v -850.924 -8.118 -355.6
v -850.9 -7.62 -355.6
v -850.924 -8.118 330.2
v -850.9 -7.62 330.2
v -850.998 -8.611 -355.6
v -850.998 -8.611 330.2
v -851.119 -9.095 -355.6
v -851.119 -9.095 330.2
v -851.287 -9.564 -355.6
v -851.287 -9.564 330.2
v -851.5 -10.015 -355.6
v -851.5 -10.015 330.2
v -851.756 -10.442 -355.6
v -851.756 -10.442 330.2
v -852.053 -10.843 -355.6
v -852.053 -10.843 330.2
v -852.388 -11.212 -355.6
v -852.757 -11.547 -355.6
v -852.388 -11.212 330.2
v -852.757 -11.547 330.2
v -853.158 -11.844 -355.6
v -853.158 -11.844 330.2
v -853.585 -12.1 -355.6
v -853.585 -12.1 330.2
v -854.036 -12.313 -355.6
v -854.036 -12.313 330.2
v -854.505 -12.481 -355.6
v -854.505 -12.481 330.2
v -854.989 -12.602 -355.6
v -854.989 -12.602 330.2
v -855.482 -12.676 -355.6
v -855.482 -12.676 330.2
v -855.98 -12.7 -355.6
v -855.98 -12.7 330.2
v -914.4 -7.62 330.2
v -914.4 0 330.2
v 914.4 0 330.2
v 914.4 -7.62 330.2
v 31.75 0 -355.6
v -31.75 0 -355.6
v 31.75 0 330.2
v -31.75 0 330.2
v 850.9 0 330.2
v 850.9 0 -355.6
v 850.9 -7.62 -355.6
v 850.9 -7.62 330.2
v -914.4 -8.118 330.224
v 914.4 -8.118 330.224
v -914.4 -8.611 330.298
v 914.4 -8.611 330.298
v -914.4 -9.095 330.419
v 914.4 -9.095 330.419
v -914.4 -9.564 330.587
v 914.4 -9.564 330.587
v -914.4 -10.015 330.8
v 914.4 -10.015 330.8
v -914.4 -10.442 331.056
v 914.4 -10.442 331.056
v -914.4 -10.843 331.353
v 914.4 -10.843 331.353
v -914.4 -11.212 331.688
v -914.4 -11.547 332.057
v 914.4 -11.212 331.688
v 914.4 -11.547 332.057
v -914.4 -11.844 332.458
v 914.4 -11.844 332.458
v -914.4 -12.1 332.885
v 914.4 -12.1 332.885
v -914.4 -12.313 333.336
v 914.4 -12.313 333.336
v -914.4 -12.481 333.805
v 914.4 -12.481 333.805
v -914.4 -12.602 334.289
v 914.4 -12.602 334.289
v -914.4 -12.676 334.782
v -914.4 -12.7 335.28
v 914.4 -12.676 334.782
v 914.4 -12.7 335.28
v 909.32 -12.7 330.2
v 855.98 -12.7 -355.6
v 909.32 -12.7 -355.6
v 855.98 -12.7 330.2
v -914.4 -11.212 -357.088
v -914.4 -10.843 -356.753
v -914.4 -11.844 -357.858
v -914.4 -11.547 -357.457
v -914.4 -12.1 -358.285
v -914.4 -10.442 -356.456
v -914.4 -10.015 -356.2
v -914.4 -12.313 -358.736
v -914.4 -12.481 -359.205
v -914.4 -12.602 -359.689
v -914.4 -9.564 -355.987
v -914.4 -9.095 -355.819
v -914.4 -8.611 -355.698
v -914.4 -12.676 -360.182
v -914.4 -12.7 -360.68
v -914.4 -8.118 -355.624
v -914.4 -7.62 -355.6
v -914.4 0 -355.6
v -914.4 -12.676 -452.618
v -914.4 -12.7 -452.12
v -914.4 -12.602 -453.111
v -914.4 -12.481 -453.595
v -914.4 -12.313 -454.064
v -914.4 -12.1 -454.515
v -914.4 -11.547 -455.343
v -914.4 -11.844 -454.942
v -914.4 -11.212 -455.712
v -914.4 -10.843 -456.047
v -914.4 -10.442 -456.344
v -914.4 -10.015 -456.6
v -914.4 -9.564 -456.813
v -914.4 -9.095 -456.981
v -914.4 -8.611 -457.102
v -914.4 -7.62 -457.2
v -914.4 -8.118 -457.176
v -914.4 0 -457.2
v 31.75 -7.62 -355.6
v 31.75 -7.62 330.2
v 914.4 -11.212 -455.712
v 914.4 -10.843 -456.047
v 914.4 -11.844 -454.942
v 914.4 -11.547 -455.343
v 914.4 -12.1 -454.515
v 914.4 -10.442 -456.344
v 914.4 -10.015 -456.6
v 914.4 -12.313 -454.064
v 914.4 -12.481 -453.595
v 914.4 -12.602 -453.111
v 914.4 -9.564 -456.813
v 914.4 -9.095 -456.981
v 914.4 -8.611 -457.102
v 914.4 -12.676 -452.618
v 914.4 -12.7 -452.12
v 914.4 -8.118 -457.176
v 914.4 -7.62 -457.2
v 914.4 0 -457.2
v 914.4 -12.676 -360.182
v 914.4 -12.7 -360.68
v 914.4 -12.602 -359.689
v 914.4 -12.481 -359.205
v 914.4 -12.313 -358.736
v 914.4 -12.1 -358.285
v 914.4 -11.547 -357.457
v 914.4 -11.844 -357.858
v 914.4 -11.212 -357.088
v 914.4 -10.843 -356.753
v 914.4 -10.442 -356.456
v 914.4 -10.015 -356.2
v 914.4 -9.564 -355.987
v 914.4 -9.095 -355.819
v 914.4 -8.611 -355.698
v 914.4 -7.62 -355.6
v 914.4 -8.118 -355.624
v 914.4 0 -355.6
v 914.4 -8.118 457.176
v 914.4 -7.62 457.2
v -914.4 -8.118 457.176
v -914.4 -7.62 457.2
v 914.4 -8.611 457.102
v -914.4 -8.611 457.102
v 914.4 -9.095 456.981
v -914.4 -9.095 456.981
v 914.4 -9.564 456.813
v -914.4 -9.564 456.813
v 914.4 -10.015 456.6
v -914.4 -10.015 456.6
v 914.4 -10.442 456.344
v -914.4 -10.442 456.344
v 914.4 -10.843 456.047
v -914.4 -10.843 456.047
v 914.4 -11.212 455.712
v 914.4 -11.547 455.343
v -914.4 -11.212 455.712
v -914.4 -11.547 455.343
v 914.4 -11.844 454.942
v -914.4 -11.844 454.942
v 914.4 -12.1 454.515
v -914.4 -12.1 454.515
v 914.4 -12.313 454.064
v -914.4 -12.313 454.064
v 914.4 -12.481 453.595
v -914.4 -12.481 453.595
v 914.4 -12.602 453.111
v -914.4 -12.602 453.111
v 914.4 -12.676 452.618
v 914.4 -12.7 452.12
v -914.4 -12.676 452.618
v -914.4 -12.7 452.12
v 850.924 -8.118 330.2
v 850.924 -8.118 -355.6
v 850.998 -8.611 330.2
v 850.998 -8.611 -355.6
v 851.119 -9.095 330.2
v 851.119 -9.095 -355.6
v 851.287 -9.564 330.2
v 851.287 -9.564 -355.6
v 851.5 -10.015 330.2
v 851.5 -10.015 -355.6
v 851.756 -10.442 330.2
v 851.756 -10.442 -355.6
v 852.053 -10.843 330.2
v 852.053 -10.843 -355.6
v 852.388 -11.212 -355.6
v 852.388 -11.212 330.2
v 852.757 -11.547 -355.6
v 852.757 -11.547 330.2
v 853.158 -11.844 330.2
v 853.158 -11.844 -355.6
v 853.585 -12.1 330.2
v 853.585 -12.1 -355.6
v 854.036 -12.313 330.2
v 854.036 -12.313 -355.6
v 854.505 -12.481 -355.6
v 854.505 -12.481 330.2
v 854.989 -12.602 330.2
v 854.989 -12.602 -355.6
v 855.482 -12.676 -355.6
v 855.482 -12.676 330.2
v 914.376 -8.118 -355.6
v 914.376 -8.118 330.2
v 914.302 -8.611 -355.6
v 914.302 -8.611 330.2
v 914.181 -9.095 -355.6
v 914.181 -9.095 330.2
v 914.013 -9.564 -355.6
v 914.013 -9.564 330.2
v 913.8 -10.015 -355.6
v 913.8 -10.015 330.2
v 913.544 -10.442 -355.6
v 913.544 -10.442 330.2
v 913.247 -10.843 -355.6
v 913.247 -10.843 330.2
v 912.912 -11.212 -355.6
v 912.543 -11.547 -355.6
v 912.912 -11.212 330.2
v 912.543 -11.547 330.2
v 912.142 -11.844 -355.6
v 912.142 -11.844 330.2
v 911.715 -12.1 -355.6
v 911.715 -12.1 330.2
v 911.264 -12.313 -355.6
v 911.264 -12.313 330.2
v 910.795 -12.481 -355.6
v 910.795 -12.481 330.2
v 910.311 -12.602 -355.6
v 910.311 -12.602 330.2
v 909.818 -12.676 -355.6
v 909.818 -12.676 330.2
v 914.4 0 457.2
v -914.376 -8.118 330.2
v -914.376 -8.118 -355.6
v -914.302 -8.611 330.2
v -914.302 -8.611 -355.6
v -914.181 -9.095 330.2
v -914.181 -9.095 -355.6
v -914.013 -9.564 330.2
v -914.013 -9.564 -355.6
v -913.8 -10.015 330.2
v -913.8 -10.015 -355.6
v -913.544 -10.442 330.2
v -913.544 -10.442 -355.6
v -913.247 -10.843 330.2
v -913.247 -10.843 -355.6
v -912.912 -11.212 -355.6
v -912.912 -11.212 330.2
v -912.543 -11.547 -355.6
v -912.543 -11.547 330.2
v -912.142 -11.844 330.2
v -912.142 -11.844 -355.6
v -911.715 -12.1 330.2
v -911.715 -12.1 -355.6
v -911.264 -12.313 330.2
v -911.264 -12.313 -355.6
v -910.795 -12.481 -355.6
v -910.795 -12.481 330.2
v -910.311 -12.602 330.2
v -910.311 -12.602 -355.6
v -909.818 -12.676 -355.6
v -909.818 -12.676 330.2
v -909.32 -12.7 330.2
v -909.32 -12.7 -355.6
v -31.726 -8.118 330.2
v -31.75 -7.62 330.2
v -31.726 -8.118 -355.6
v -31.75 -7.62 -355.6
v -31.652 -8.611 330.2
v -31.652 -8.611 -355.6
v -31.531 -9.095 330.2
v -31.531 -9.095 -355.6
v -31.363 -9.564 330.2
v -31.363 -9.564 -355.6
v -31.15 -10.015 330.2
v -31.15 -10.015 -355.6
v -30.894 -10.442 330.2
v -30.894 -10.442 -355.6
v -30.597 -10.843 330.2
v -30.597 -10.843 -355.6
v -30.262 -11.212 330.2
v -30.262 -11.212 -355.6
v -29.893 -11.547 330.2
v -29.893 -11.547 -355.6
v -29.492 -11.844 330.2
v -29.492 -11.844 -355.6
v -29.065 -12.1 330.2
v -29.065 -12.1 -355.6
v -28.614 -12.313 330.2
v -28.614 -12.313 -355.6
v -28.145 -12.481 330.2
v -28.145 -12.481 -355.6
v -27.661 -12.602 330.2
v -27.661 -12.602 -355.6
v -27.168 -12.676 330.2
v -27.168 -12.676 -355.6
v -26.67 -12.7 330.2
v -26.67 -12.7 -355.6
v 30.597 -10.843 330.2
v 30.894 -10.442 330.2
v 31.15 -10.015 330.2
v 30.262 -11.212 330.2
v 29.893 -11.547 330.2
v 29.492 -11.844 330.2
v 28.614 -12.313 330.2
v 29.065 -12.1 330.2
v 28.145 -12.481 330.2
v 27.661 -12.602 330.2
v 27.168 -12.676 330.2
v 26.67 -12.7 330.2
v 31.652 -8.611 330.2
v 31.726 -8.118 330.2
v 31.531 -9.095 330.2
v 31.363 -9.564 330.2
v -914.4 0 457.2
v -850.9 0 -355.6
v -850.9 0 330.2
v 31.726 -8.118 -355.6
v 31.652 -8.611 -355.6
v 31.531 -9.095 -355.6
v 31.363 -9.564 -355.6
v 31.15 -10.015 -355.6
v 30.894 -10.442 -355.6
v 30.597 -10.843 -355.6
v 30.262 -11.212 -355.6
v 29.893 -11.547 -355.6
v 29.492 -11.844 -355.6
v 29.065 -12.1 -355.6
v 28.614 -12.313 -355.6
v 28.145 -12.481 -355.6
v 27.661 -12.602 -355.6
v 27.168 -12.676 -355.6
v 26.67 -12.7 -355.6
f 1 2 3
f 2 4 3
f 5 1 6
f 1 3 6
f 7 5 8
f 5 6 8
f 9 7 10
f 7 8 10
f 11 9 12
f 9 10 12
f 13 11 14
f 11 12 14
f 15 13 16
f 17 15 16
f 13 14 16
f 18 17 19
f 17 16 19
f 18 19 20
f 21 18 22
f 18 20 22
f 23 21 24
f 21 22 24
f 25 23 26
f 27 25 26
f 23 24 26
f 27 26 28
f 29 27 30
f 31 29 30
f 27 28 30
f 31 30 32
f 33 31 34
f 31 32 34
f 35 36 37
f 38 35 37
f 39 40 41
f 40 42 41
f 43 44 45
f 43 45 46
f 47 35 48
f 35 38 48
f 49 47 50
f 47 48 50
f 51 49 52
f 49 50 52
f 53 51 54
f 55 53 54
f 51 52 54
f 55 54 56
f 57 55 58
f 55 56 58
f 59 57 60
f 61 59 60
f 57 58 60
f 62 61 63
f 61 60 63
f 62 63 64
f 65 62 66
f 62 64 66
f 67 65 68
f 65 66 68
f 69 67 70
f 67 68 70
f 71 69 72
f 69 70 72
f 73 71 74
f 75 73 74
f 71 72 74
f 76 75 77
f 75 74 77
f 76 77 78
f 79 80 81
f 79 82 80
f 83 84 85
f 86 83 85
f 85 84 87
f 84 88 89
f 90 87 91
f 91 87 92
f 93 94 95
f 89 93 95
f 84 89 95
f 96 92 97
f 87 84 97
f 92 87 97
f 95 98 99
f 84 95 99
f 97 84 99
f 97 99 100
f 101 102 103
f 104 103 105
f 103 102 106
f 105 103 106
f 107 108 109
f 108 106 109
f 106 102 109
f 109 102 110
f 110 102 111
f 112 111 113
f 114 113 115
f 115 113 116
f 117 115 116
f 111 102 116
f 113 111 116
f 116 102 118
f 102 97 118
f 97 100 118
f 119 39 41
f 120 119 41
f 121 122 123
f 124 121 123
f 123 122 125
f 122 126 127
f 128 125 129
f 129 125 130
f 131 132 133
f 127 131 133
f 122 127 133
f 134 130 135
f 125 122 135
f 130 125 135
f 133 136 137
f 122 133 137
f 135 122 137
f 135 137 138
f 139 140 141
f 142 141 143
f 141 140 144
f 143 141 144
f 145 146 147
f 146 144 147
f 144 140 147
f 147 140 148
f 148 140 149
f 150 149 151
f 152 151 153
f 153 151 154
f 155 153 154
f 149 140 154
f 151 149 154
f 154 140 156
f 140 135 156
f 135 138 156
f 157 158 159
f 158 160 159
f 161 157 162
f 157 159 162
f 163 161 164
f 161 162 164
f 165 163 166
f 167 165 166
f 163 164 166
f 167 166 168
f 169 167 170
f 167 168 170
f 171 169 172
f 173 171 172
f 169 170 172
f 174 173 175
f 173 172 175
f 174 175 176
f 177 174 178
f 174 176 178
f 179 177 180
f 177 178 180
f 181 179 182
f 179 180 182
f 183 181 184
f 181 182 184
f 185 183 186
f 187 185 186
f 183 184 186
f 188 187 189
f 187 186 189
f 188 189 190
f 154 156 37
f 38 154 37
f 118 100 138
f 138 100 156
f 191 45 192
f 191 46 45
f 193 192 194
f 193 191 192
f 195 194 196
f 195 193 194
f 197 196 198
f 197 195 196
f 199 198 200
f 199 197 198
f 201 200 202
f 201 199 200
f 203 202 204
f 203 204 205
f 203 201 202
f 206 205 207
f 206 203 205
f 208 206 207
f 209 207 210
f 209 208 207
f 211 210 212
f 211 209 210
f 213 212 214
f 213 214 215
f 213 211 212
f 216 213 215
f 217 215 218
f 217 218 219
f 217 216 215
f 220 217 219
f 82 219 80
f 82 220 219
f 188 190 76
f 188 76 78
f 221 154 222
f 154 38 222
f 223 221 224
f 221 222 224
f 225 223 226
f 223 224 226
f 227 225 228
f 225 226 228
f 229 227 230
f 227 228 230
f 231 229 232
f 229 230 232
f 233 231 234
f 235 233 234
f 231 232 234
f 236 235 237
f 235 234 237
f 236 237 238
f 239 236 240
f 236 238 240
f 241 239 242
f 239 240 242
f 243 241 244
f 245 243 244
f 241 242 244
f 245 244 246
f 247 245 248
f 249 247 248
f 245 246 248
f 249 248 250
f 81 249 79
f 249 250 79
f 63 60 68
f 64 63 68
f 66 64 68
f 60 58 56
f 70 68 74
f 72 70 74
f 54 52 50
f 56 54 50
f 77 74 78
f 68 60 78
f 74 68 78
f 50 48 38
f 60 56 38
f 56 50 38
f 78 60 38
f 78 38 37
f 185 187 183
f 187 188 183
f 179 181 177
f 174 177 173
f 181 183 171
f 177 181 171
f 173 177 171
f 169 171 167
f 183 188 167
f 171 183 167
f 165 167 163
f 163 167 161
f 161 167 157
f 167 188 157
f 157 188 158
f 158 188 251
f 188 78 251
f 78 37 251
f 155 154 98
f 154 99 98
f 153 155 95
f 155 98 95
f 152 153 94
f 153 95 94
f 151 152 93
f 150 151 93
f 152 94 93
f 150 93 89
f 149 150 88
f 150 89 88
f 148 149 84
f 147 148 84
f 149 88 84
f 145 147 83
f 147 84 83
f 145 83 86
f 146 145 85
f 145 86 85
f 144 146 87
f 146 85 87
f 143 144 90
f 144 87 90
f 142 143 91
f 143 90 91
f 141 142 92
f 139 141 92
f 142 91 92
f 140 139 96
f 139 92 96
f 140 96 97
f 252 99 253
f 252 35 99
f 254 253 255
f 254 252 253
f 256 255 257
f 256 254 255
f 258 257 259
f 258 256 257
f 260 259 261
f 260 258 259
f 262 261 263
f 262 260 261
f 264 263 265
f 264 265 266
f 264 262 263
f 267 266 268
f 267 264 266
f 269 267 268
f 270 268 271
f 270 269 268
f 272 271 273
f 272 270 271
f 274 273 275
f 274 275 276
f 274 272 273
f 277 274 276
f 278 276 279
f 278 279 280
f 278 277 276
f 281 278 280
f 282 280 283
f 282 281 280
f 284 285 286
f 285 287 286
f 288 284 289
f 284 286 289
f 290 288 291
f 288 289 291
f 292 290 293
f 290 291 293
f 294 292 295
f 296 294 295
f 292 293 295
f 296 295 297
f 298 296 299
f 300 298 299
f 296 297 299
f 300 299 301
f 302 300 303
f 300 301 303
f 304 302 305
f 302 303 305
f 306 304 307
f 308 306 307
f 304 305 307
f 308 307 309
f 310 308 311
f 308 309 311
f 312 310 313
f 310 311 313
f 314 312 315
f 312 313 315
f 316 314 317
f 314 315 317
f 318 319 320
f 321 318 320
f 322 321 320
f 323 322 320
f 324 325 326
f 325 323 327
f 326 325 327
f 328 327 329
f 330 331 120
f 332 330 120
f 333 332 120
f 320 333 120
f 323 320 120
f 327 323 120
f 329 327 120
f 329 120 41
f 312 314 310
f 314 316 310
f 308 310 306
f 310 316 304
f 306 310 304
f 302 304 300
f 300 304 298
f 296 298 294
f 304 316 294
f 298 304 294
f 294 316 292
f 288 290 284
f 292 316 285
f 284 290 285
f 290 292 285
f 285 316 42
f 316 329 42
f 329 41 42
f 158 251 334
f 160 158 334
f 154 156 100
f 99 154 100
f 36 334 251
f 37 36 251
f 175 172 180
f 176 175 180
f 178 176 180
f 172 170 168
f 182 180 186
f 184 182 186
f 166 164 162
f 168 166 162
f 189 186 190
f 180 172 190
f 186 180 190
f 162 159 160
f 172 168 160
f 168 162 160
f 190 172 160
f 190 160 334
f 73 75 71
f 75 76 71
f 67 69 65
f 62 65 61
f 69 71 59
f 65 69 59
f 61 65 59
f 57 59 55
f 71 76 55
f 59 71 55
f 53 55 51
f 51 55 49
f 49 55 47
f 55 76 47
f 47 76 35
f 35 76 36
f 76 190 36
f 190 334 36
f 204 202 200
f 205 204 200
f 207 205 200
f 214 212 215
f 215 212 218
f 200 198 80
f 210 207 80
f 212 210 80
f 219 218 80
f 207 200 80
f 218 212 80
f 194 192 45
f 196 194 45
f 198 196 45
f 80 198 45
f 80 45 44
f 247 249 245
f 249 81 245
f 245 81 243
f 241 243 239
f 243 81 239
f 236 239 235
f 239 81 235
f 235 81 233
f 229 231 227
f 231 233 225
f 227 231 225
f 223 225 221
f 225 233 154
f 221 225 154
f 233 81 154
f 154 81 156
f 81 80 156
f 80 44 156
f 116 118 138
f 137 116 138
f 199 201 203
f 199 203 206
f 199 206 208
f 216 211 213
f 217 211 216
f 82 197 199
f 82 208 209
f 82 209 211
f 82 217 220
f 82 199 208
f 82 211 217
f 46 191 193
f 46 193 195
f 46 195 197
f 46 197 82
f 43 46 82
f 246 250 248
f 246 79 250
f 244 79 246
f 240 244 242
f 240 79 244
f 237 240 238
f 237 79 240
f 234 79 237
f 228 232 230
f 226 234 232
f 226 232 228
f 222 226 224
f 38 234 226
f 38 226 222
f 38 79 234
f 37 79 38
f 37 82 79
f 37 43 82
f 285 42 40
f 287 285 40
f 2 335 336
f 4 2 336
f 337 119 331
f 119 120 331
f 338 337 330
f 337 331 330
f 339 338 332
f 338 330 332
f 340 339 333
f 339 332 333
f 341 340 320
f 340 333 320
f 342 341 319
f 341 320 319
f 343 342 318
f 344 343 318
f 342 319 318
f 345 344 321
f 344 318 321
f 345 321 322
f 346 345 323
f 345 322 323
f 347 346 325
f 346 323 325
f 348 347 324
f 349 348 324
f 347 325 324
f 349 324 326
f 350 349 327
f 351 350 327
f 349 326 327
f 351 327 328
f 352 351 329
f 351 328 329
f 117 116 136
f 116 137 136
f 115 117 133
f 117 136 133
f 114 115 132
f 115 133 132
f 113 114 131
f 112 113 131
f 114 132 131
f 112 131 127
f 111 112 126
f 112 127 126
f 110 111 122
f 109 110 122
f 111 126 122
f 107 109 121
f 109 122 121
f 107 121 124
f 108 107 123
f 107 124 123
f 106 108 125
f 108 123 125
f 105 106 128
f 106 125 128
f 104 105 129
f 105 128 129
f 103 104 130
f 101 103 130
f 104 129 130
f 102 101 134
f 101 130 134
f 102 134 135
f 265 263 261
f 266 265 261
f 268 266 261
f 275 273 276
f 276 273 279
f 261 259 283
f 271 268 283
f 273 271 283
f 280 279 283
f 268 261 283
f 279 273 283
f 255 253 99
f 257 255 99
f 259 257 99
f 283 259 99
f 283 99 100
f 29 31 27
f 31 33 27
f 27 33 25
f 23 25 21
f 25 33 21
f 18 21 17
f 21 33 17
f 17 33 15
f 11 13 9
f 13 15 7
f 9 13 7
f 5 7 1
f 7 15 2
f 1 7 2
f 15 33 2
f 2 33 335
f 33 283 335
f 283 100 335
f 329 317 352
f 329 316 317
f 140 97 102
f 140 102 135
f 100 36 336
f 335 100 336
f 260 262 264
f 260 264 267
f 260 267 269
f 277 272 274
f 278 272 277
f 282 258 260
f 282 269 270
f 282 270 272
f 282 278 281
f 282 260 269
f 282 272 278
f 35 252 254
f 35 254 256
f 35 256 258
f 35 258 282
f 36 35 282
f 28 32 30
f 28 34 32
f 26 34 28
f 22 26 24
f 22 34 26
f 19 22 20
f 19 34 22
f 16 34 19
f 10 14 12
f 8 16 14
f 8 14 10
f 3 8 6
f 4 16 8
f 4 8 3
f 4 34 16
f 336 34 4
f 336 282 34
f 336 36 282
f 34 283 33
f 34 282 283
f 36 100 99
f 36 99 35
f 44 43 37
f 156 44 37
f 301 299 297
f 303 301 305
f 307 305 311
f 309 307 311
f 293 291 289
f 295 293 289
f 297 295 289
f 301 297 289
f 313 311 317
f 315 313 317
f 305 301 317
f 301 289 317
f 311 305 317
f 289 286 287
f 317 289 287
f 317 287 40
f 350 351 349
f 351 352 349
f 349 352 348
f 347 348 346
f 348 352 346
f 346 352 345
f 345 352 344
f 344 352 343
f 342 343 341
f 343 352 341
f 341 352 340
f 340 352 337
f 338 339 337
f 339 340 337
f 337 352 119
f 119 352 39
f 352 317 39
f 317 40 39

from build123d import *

# Parameters (mm, degrees)
F1_DEPTH = 12.7
F0_W     = 63.5
F0_H     = 685.8
F2_DEPTH = 12.7
F3_R     = 5.08
F3_2_R   = 5.08


with BuildPart() as f1:
    # F0 (on Front) → F1 (new body)
    with BuildSketch(Plane.XZ):
        Polygon((-914.4, 457.2), (-914.4, 330.2), (-850.9, 330.2), (-31.75, 330.2), (0, 330.2), (0, 457.2), align=None)
        Polygon((850.9, 330.2), (914.4, 330.2), (914.4, 457.2), (0, 457.2), (0, 330.2), (31.75, 330.2), align=None)
        Polygon((-914.4, -457.2), (914.4, -457.2), (914.4, -355.6), (850.9, -355.6), (31.75, -355.6), (-31.75, -355.6), (-850.9, -355.6), (-914.4, -355.6), align=None)
    extrude(amount=F1_DEPTH)

    # F3
    f3_edges = [f1.edges().sort_by_distance(p)[0] for p in [
        (0, -12.7, 457.2),
        (0, -12.7, 330.2),
        (0, -12.7, -355.6),
        (0, -12.7, -457.2),
    ]]
    fillet(f3_edges, radius=F3_R)


with BuildPart() as f2:
    # F0 (on Front) → F2 (new body)
    with BuildSketch(Plane.XZ):
        with Locations((-882.65, -12.7)):
            Rectangle(F0_W, F0_H)
        Polygon((-31.75, -355.6), (31.75, -355.6), (31.75, 330.2), (0, 330.2), (-31.75, 330.2), align=None)
        with Locations((882.65, -12.7)):
            Rectangle(F0_W, F0_H)
    extrude(amount=F2_DEPTH)

    # F3#2
    f3_2_edges = [f2.edges().sort_by_distance(p)[0] for p in [
        (914.4, -12.7, -12.7),
        (850.9, -12.7, -12.7),
        (-850.9, -12.7, -12.7),
        (-914.4, -12.7, -12.7),
        (-31.75, -12.7, -12.7),
        (31.75, -12.7, -12.7),
    ]]
    fillet(f3_2_edges, radius=F3_2_R)


solid = Compound([f1.part, f2.part])
